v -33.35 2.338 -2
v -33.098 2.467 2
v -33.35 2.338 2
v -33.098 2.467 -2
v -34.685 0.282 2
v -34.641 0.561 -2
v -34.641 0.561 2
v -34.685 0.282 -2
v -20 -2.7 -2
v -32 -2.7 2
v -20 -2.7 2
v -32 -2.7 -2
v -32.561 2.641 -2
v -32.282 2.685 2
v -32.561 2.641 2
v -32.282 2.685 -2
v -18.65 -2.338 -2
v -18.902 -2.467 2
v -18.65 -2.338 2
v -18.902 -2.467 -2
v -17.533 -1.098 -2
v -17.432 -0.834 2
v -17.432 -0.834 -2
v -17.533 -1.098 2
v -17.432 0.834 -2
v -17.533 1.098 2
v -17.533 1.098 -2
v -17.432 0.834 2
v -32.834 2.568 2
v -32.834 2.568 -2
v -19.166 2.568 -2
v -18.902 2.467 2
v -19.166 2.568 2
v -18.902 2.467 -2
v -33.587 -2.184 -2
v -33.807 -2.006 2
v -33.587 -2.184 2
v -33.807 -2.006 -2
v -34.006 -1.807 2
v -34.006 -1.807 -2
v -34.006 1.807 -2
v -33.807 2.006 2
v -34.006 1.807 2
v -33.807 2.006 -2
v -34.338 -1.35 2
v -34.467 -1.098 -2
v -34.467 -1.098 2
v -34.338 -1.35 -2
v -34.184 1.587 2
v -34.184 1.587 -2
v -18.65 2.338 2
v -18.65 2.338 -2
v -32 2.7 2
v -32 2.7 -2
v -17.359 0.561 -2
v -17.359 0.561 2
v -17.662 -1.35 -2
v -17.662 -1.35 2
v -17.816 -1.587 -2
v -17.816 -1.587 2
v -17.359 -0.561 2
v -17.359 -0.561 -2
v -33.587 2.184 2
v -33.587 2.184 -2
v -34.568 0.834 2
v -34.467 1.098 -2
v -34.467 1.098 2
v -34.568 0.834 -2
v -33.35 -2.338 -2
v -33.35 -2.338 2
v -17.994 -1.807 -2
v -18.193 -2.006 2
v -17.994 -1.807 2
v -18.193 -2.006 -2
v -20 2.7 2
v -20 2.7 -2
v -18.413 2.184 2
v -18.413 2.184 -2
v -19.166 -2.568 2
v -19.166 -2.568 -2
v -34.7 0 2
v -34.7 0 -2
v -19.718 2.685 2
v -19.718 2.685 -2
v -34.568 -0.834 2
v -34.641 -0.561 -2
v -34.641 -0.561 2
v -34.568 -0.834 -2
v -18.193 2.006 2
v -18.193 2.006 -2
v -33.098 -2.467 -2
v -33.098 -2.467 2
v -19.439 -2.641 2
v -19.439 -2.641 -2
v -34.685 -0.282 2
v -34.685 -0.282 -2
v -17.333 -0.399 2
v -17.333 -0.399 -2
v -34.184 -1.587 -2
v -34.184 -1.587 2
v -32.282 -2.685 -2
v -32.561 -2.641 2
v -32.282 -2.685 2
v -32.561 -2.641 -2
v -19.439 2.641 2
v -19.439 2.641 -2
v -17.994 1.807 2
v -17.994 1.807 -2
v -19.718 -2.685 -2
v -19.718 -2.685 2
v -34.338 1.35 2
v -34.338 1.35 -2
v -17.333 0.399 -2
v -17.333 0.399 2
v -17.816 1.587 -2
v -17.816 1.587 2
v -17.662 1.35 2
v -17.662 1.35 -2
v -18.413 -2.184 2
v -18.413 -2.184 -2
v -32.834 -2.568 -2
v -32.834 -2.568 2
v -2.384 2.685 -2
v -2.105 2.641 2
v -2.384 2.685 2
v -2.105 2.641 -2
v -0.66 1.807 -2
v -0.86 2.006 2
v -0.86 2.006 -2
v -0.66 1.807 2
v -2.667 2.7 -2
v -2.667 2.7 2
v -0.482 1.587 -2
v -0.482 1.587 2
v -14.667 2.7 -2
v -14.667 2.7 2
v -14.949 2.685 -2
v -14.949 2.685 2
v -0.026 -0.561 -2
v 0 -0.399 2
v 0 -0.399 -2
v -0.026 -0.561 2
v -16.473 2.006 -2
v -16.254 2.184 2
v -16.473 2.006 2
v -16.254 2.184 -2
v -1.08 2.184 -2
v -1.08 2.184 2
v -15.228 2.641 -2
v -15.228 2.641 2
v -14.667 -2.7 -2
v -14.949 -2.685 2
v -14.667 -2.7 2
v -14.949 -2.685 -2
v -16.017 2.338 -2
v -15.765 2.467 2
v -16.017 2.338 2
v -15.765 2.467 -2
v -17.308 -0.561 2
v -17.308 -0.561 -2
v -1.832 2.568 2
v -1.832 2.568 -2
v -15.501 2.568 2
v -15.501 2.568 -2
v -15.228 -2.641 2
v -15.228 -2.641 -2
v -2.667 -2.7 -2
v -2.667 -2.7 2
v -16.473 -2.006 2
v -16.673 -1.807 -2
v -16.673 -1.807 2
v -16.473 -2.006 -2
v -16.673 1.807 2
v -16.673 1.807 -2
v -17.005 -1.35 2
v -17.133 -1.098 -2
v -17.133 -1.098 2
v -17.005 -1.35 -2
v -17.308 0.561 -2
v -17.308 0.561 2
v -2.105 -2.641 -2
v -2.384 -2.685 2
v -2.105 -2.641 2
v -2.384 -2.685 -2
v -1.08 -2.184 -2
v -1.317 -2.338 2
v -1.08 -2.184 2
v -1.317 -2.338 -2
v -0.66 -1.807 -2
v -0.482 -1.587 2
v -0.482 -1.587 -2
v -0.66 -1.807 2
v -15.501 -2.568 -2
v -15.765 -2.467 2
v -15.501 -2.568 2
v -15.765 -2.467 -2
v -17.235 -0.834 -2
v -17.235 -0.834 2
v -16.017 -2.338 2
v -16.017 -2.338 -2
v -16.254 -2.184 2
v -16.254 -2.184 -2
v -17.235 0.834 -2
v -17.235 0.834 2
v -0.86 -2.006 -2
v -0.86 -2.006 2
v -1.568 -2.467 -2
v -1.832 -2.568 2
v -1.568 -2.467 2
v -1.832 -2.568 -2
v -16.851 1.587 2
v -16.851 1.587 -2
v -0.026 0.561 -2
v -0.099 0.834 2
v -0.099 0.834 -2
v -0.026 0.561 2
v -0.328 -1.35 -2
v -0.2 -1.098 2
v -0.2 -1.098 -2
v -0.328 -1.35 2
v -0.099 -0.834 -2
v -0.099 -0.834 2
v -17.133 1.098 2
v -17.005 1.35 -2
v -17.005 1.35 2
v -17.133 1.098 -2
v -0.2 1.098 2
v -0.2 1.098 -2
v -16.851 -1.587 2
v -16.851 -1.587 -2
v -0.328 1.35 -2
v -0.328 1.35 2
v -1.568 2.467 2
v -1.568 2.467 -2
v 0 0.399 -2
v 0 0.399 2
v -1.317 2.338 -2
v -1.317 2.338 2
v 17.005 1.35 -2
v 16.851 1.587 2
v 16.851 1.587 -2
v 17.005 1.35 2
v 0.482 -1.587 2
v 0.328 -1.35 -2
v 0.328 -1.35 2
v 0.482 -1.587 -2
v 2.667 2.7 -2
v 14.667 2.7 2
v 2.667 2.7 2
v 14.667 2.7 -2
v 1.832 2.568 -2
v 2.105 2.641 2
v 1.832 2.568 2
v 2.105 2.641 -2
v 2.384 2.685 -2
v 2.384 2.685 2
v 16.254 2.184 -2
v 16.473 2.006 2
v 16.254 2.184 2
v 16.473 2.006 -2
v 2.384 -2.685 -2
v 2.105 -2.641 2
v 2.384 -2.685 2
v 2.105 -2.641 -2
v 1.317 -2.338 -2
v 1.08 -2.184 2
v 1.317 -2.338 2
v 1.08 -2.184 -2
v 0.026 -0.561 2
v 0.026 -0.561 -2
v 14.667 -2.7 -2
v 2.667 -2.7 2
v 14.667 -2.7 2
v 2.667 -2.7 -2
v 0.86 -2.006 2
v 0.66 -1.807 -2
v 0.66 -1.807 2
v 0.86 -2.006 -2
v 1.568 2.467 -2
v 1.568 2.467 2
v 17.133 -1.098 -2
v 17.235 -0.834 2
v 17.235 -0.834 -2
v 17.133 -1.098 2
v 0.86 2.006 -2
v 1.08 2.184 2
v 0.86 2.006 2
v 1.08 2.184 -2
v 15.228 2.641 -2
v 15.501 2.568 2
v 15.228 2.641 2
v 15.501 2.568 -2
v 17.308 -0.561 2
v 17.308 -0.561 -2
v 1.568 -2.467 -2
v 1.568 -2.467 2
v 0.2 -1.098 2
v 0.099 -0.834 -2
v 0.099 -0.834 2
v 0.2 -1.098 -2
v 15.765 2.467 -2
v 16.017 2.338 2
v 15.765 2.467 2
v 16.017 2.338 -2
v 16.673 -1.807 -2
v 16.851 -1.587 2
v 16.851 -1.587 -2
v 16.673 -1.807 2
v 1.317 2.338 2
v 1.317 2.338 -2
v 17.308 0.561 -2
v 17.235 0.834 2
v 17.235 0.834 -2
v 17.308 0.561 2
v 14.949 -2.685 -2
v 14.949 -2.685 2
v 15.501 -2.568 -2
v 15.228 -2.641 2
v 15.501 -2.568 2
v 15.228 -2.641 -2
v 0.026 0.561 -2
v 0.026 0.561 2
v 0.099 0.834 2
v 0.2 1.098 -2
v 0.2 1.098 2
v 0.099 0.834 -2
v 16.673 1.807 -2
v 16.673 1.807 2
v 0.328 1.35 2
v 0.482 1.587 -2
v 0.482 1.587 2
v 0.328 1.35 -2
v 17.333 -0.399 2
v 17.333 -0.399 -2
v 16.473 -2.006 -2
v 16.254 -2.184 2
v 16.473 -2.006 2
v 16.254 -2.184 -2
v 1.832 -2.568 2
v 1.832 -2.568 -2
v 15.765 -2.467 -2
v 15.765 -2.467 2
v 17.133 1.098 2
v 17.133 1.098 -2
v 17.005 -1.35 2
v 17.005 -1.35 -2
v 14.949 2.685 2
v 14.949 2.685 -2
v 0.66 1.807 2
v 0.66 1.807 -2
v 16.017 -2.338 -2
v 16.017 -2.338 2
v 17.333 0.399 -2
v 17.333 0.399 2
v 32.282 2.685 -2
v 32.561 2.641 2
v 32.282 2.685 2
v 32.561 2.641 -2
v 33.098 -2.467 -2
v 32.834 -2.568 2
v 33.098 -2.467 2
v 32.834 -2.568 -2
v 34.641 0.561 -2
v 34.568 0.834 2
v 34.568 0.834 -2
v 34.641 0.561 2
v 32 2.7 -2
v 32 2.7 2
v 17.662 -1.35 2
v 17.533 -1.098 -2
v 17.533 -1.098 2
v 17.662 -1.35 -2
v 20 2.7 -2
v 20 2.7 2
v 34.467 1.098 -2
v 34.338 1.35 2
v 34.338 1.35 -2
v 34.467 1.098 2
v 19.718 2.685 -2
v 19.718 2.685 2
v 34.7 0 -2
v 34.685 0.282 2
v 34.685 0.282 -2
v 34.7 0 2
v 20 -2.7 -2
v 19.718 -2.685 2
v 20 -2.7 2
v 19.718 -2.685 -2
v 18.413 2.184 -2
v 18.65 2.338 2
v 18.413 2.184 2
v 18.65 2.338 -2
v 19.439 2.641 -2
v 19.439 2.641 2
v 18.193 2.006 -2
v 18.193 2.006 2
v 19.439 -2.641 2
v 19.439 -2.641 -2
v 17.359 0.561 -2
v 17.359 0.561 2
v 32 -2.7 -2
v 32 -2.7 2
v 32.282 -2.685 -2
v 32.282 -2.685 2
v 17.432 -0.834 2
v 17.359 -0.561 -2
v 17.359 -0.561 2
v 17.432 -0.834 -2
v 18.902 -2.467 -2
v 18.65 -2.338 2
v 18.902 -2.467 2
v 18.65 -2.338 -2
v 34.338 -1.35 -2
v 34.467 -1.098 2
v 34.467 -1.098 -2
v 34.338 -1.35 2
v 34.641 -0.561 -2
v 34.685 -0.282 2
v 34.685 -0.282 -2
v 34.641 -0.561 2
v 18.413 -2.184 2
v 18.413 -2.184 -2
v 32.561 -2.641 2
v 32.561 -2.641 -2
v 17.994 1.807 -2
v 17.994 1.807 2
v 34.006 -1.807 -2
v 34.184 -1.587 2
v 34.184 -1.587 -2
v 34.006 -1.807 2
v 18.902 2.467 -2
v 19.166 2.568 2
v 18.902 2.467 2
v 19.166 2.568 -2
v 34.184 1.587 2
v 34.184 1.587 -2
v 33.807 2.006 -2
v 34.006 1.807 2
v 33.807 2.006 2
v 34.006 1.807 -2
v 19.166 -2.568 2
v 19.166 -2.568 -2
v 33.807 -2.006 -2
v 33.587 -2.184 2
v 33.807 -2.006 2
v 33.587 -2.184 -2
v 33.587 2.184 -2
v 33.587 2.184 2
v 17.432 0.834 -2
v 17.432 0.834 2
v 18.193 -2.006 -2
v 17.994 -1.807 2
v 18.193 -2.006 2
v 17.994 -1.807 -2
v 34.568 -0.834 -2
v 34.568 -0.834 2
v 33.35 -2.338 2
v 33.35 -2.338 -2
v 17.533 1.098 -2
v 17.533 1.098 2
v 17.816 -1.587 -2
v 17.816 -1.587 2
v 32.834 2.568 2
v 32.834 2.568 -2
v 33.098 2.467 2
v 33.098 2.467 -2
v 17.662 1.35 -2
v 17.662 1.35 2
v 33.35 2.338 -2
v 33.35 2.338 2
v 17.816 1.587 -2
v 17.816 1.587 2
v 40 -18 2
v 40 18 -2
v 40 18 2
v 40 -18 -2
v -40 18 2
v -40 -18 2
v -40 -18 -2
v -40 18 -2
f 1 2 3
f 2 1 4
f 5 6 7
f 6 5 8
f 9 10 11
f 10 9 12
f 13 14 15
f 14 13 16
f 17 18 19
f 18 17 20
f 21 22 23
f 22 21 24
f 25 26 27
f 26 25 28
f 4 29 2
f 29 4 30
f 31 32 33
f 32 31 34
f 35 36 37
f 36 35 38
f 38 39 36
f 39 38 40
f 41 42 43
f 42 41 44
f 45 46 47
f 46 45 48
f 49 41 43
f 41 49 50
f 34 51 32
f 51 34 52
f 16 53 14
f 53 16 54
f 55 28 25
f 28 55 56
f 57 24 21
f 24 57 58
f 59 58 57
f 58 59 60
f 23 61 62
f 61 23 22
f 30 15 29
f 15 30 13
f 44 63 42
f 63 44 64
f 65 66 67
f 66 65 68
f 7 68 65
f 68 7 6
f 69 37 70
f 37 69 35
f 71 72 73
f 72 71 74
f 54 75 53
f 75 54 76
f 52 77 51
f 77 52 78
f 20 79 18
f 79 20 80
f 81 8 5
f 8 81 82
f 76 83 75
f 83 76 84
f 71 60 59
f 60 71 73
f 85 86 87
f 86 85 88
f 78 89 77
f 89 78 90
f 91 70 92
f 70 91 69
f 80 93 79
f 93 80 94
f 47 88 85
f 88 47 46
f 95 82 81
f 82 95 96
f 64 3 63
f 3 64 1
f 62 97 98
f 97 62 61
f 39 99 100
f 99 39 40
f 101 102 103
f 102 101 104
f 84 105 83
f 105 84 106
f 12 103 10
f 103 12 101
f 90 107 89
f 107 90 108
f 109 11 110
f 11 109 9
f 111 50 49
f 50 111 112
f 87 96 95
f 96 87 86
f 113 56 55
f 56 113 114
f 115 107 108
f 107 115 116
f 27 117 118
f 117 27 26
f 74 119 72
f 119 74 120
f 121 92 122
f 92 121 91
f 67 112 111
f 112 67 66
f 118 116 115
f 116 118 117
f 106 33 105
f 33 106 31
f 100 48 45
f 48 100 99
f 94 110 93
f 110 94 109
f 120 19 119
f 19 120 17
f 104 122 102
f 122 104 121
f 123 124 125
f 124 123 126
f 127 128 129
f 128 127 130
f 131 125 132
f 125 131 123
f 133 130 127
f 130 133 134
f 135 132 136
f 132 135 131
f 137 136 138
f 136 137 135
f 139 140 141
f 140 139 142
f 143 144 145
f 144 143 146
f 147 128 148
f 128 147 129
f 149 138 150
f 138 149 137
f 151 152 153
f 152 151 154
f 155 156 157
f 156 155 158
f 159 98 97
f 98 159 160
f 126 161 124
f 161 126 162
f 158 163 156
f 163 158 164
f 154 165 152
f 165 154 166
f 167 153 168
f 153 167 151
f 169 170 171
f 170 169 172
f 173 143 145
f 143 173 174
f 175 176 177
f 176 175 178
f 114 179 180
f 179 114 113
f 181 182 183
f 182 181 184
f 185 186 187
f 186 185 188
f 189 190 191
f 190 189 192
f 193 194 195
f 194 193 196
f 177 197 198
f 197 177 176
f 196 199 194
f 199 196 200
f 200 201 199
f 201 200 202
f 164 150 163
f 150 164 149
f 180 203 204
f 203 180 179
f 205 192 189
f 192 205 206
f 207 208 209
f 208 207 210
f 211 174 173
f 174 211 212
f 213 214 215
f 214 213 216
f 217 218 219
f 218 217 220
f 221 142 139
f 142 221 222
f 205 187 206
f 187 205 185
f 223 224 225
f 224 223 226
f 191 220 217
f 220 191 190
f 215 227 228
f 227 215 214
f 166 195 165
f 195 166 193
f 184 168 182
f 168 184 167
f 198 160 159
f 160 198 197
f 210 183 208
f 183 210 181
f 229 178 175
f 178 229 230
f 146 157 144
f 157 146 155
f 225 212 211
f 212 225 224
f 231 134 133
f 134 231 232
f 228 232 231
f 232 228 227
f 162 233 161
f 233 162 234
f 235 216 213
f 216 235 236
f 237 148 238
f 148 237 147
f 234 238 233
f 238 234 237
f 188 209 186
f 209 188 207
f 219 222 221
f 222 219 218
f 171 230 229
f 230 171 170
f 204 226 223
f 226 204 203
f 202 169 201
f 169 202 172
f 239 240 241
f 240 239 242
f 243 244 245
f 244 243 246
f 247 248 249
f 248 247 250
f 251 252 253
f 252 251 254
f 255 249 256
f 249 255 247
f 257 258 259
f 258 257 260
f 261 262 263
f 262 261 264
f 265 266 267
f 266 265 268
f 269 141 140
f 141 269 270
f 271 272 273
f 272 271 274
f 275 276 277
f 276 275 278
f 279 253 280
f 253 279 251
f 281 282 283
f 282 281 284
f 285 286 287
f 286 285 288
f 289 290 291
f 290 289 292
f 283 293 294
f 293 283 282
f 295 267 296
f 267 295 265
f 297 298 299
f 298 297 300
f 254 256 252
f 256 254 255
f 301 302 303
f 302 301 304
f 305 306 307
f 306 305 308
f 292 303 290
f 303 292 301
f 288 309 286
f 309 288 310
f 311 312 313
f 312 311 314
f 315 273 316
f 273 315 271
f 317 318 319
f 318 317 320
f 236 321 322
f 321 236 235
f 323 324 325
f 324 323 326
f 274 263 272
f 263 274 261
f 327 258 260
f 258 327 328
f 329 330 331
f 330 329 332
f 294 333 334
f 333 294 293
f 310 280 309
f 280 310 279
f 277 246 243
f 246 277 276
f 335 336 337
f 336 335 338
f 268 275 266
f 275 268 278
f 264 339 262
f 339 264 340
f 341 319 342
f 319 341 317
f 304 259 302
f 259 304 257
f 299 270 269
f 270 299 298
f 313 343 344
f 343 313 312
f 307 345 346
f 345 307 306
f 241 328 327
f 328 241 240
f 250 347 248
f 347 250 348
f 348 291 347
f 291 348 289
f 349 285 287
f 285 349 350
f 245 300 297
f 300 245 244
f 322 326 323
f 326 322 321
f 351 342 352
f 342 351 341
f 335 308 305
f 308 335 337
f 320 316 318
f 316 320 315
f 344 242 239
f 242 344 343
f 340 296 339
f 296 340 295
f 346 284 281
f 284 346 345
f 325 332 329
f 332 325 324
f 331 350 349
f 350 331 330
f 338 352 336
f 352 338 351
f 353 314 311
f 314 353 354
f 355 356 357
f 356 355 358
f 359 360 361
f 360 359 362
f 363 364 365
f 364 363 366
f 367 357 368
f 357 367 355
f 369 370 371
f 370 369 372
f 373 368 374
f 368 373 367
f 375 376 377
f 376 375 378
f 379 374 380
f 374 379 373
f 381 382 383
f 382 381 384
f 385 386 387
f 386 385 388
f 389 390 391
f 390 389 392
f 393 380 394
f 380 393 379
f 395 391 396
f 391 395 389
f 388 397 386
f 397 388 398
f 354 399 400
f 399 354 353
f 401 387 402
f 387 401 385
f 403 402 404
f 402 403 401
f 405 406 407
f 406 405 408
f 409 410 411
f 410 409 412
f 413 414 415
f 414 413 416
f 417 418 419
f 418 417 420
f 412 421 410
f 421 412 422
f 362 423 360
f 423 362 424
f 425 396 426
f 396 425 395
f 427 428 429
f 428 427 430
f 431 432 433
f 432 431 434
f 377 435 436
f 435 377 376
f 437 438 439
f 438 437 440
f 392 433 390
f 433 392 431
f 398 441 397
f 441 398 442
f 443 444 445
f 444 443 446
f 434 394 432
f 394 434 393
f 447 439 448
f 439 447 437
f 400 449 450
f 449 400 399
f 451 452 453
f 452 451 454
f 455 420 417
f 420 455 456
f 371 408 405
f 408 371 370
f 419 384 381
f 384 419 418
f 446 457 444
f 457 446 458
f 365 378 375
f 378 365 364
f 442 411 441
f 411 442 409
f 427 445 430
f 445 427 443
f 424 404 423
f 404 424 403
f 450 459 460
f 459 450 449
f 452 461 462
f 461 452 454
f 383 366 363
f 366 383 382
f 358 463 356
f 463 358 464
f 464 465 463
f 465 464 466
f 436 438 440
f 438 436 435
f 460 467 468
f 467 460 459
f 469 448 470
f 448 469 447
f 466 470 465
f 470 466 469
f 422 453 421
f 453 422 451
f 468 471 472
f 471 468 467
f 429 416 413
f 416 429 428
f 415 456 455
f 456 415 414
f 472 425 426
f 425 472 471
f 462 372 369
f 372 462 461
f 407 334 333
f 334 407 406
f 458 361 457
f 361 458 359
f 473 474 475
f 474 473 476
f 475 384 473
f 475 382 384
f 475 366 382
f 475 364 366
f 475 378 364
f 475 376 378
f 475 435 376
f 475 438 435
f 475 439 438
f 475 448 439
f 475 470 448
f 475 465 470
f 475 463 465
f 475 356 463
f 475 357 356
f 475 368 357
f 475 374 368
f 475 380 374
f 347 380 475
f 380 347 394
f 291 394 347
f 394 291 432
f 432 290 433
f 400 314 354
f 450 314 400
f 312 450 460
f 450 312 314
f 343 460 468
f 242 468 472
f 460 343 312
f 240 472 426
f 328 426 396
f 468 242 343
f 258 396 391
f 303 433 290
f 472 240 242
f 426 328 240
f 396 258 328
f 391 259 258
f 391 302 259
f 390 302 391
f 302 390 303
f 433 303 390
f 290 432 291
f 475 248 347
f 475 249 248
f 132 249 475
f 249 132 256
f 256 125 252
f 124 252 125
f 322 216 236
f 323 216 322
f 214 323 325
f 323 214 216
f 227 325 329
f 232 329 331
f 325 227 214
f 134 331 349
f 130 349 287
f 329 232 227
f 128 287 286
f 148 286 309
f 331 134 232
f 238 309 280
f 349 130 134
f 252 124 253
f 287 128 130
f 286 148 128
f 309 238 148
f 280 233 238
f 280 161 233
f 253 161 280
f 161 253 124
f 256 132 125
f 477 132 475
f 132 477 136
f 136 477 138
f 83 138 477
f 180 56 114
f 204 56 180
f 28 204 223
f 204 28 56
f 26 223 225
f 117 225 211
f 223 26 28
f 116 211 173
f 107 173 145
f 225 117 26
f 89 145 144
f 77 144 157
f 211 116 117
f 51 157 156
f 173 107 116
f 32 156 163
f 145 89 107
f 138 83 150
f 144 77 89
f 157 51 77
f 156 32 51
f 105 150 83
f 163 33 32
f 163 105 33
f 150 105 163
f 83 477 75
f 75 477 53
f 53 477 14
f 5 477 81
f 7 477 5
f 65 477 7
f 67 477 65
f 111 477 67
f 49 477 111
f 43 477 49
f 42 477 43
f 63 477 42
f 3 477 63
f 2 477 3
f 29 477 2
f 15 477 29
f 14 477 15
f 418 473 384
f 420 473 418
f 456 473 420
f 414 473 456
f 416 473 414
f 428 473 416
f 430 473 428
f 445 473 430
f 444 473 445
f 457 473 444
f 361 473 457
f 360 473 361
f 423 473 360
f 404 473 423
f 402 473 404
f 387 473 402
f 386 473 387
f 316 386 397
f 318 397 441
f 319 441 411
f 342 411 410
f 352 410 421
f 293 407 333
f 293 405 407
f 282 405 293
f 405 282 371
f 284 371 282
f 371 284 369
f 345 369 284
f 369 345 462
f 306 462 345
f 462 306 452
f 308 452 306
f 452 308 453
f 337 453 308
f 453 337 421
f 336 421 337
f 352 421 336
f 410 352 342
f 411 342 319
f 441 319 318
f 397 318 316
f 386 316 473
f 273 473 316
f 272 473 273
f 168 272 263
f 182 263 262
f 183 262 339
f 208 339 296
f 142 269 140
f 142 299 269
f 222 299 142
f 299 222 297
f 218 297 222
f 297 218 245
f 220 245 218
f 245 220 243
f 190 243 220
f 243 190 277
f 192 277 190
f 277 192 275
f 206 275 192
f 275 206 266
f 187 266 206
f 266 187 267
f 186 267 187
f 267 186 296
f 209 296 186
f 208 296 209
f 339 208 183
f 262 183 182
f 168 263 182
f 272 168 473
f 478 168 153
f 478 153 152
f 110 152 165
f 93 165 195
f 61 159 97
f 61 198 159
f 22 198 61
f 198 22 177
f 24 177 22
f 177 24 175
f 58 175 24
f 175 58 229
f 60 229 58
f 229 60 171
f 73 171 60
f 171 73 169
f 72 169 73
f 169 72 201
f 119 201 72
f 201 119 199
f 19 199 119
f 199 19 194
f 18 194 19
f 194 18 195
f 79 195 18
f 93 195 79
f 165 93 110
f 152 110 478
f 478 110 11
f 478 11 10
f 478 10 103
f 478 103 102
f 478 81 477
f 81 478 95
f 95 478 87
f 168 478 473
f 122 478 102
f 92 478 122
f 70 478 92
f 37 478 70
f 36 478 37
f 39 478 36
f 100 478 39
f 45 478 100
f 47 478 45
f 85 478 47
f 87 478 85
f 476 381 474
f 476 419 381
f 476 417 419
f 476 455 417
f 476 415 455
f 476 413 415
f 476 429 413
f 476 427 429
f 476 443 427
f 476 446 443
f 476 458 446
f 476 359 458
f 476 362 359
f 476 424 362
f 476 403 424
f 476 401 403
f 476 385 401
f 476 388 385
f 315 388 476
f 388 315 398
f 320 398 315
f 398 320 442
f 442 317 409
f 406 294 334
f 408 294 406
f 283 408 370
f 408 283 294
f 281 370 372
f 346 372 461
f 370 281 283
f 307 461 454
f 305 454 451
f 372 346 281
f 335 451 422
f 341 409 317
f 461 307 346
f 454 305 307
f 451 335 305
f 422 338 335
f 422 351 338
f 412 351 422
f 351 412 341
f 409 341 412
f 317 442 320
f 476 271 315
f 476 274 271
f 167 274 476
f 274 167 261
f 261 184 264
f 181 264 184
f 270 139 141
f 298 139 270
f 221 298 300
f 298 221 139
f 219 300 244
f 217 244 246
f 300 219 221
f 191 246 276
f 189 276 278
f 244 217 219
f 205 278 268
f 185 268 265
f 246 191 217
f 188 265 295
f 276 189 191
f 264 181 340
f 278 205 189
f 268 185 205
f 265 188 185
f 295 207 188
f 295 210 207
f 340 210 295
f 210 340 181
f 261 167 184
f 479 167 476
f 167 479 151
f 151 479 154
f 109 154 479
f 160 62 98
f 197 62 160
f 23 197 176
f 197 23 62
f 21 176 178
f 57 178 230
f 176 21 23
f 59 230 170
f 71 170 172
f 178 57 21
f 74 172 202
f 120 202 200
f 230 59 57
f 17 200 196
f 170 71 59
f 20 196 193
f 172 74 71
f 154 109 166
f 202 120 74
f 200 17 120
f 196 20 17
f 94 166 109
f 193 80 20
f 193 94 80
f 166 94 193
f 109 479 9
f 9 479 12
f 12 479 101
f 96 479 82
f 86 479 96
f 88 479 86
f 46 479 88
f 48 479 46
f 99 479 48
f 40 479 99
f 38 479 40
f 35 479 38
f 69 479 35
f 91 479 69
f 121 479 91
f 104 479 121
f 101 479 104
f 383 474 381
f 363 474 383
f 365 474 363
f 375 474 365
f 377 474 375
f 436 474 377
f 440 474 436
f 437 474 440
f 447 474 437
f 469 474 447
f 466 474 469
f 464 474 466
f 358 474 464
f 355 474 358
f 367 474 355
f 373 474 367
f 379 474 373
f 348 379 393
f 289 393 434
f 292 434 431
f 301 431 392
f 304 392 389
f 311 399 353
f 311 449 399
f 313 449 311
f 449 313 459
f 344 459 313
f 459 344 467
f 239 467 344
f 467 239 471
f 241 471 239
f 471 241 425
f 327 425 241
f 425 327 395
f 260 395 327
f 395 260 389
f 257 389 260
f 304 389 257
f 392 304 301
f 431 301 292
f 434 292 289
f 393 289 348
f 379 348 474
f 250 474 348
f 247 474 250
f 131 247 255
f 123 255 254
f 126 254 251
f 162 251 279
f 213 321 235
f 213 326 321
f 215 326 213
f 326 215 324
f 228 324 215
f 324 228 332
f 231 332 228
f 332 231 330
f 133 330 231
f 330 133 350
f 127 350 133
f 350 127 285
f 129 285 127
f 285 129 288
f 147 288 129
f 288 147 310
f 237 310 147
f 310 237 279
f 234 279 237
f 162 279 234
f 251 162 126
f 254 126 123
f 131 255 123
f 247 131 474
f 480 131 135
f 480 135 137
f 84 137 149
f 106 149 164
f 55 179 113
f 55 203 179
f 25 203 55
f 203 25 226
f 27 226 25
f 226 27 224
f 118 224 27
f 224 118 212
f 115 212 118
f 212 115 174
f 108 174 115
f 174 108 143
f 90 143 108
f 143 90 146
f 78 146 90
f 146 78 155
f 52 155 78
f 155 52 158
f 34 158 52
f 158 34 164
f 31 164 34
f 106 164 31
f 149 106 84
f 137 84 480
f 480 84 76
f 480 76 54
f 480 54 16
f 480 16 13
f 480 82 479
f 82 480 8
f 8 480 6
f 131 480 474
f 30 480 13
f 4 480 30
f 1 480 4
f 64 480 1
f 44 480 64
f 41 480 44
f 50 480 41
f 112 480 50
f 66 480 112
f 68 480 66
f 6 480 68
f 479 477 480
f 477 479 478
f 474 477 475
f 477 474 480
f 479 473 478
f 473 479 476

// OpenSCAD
// Slotted mounting plate.
$fn = 60;
eps = 0.02;
plate_l = 80;
plate_w = 36;
plate_t = 4;
slot_l = 12;
slot_d = 5.4;
module slot(x) { hull() { translate([x-slot_l/2,0,-plate_t/2-eps]) cylinder(d=slot_d,h=plate_t+2*eps); translate([x+slot_l/2,0,-plate_t/2-eps]) cylinder(d=slot_d,h=plate_t+2*eps); } }
difference() { cube([plate_l, plate_w, plate_t], center=true); for (i=[0:3]) slot(-plate_l/2+14+i*(plate_l-28)/max(1,3)); }
